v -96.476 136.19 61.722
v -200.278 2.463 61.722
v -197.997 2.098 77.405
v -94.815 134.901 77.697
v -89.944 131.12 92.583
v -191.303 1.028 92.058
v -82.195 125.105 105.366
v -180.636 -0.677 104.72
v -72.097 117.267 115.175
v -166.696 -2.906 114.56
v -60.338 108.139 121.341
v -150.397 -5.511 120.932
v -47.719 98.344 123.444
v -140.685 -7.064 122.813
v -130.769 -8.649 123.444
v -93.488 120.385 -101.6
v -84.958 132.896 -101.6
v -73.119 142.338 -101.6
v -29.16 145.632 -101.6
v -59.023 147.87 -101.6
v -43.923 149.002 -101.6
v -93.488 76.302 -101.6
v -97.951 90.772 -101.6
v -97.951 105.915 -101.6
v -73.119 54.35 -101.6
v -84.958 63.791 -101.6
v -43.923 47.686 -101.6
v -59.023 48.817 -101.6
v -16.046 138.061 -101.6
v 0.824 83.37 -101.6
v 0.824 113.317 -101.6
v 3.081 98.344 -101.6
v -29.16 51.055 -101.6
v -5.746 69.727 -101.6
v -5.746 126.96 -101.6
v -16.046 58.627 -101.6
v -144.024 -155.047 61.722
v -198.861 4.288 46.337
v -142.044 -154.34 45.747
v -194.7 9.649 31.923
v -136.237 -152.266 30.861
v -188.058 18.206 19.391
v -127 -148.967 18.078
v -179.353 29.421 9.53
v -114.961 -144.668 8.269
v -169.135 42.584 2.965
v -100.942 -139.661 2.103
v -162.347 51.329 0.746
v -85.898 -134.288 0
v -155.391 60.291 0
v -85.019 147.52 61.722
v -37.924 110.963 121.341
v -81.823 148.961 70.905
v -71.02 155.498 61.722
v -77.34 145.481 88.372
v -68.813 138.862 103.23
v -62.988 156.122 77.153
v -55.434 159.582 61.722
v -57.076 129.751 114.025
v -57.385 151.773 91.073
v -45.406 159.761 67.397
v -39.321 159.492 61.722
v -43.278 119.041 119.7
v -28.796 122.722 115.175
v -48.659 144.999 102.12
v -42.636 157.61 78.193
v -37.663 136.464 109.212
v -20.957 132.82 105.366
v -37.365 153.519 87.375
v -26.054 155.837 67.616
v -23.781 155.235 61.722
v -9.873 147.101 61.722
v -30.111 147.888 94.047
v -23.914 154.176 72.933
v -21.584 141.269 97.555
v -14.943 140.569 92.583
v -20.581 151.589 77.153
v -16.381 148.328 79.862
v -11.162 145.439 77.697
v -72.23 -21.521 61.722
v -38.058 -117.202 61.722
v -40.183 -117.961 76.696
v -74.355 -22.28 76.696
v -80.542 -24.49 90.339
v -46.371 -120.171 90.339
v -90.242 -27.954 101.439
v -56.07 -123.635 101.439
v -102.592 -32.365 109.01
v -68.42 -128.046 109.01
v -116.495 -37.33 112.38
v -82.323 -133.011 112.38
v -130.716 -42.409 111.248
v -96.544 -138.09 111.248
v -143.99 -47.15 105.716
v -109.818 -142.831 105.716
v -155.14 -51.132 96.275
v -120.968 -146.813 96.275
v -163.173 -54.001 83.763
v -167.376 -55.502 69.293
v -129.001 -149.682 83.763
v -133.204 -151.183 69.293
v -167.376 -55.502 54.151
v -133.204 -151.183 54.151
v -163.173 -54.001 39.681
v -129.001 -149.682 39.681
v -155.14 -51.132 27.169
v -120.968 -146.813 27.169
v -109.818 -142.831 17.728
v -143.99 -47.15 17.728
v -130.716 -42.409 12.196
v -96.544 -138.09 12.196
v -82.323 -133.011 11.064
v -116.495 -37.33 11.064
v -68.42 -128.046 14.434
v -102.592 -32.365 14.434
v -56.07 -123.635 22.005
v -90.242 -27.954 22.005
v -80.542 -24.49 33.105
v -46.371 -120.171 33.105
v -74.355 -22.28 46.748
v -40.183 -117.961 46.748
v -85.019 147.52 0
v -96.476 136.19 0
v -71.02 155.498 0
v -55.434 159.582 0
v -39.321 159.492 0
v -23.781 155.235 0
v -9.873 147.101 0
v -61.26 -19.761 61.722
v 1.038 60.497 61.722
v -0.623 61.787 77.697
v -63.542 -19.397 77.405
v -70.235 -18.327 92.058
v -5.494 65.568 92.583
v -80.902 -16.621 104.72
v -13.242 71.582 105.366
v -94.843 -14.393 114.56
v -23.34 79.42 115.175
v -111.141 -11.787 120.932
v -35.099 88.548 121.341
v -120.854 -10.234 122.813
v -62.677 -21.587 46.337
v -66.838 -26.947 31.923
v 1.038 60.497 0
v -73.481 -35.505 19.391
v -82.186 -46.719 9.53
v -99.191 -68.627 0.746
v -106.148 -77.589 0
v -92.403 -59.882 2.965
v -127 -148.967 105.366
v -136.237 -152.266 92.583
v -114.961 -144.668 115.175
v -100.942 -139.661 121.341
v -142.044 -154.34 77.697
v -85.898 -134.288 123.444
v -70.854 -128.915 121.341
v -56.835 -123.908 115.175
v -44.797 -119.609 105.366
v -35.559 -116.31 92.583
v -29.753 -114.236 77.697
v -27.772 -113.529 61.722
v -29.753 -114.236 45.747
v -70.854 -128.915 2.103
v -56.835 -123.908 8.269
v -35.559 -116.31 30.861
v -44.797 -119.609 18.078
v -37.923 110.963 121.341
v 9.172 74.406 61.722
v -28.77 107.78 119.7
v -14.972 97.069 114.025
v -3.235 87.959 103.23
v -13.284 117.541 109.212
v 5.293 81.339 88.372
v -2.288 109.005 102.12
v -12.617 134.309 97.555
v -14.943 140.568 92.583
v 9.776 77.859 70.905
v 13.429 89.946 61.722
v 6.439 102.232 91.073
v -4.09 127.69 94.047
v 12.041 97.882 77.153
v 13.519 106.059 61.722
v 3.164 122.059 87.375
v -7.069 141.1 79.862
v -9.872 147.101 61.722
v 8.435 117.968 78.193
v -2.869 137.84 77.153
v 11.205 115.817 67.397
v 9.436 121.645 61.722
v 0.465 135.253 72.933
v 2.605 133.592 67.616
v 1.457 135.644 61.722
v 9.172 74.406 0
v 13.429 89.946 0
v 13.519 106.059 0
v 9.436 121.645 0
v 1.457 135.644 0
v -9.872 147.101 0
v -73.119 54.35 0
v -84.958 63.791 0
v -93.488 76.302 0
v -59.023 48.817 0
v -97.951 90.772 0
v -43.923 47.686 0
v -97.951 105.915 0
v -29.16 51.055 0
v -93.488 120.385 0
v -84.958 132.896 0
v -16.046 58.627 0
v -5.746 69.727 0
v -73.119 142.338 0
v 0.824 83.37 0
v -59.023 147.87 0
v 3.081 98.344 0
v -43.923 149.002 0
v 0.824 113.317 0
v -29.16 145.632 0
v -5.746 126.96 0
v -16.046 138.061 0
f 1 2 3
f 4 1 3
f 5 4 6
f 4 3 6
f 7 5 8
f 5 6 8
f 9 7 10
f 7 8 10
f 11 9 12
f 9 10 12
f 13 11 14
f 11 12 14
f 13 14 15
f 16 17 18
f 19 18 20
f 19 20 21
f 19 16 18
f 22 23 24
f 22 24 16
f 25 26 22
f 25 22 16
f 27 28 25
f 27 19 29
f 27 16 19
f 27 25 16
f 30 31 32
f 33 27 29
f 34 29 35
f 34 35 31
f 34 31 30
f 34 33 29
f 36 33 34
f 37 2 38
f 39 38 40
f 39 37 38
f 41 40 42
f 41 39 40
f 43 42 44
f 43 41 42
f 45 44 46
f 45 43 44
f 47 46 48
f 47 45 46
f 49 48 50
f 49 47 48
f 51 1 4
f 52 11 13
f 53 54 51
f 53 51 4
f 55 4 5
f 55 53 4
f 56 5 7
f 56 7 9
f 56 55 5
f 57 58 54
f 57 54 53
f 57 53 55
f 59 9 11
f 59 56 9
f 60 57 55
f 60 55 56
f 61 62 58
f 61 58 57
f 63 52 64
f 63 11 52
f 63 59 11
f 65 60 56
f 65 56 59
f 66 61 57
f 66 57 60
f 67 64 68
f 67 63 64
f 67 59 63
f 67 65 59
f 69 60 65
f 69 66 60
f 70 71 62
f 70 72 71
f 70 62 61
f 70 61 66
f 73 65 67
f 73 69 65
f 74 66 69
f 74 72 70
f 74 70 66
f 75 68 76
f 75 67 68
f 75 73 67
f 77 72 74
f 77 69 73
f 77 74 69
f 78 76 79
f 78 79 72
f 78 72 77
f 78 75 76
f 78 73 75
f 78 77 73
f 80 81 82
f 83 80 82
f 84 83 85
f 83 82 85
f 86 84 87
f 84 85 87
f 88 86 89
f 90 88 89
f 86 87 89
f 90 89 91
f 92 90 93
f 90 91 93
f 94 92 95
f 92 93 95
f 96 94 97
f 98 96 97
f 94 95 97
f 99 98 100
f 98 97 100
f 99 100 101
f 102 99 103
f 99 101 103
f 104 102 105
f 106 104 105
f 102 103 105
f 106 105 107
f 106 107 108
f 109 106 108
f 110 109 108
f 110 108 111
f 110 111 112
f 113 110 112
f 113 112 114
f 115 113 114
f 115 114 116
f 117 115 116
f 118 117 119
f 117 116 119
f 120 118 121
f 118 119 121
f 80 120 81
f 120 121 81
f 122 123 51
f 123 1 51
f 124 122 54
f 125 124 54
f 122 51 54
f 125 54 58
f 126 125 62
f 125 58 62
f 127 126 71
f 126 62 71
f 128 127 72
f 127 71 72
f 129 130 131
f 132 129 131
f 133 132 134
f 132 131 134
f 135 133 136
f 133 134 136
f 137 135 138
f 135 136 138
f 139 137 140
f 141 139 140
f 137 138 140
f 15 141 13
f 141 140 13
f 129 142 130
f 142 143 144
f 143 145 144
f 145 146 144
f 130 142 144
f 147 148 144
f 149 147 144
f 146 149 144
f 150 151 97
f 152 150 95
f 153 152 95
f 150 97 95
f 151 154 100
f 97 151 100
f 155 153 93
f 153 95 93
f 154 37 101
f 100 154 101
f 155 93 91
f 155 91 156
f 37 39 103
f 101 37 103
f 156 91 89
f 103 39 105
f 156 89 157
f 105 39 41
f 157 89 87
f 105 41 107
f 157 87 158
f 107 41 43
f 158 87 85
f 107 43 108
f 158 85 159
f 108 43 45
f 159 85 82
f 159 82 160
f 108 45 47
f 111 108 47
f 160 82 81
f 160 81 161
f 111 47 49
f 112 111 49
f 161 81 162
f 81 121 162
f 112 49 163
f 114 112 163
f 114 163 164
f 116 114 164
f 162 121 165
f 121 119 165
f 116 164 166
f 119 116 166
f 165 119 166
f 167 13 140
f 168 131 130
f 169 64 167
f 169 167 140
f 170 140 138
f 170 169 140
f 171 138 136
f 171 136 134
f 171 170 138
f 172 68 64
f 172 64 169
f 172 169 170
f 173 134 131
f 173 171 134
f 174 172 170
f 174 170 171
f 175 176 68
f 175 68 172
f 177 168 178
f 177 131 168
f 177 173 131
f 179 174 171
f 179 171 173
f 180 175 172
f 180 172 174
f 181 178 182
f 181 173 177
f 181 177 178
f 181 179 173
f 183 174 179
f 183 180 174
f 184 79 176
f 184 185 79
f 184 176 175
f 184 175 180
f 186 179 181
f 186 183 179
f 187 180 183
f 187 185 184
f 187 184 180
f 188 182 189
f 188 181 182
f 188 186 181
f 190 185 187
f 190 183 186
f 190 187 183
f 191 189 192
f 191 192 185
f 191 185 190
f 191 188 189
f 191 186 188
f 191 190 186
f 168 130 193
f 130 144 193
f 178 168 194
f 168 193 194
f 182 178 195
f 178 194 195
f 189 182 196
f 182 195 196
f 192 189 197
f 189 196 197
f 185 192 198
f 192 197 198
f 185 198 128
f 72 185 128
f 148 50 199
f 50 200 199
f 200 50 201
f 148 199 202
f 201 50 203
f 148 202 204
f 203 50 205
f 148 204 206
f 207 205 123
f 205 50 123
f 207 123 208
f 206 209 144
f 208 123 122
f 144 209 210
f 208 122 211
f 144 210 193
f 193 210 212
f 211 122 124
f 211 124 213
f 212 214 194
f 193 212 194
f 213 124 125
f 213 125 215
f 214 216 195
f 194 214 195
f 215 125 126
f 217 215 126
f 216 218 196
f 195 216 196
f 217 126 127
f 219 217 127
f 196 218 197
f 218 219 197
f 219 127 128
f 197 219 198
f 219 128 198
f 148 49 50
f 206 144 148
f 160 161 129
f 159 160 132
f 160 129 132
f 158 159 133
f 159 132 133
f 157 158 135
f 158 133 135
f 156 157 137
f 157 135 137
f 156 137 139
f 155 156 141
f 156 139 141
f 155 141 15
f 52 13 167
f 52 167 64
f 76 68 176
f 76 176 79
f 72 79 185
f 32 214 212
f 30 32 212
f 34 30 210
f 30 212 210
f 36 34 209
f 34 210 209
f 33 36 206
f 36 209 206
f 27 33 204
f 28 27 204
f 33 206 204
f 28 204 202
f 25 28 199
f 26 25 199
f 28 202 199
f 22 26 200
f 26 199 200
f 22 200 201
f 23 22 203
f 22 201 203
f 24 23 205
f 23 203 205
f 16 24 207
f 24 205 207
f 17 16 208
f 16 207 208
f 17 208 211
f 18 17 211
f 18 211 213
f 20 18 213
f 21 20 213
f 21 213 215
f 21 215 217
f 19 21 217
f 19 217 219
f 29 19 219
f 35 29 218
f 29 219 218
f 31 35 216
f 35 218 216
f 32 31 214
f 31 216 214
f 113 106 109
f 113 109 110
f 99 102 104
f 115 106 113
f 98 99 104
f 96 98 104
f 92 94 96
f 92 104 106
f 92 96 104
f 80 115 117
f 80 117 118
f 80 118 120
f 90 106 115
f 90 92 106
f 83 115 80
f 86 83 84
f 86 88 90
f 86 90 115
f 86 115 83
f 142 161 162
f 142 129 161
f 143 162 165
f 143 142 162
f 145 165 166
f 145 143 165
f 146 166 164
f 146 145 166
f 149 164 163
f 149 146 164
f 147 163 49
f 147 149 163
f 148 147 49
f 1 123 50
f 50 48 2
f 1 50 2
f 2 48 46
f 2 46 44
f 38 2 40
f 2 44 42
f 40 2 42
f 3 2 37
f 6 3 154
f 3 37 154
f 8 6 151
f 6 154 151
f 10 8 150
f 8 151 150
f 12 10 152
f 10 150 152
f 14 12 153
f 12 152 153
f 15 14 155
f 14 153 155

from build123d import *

# Parameters (mm, degrees)
BOSS_EXTRUDE1_DEPTH = 123.444
FILLET1_R           = 61.722
FILLET2_R           = 61.722
SKETCH3_R           = 50.800000000000004
BOSS_EXTRUDE2_DEPTH = 101.6
SKETCH4_R           = 50.8
CUT_EXTRUDE1_DEPTH  = 101.6


with BuildPart() as part:
    # Sketch1 → Boss-Extrude1 (new body)
    with BuildSketch(Plane.XY):
        Polygon((-61.2603734439835, -19.761410788381728), (38.88466731371064, 109.25427234990879), (-58.62951931958517, 184.9471025337958), (-200.27811700244362, 2.4628730865096857), (-144.02441960258417, -155.04747963309688), (-27.772031067671065, -113.52876944205649), align=None)
    extrude(amount=BOSS_EXTRUDE1_DEPTH)

    # Fillet1
    fillet1_edges = [part.edges().sort_by_distance(p)[0] for p in [
        (-44.51620225582728, -66.6450901152191, 123.444),
        (-172.1512683025139, -76.2923032732936, 123.444),
        (-172.1512683025139, -76.2923032732936, 0),
        (-44.51620225582728, -66.6450901152191, 0),
        (-11.187853065136423, 44.74643078076353, 123.444),
        (-129.4538181610144, 93.70498781015274, 123.444),
    ]]
    fillet(fillet1_edges, radius=FILLET1_R - 0.0001)  # a hair under: the kernel refuses the full size

    # Fillet2
    fillet2_edges = [part.edges().sort_by_distance(p)[0] for p in [
        (-58.62951931958517, 184.9471025337958, 30.861050000000017),
        (38.88466731371064, 109.25427234990879, 30.86105000000001),
        (24.604068449214424, 120.33921272724501, 105.36607403771798),
        (-44.34892045508896, 173.86216215645953, 105.366074037718),
    ]]
    fillet(fillet2_edges, radius=FILLET2_R - 0.0001)  # a hair under: the kernel refuses the full size

    # Sketch3 → Boss-Extrude2 (add)
    with BuildSketch(Plane(origin=(0, 0, 0), x_dir=(-1, 0, 0), z_dir=(0, 0, -1))):
        with Locations(Location((47.71884109488077, 98.3435941252044, 0), (0, 0, 180))):
            Circle(SKETCH3_R)
    extrude(amount=BOSS_EXTRUDE2_DEPTH)

    # Sketch4 → Cut-Extrude1 (cut)
    with BuildSketch(Plane(origin=(32.81770626358453, -91.88957753803668, 0), x_dir=(0.9417419115948374, 0.3363363969981563, 0), z_dir=(0.3363363969981563, -0.9417419115948374, 0))):
        with Locations((-126.05994289631548, 61.722)):
            Circle(SKETCH4_R)
    extrude(amount=-CUT_EXTRUDE1_DEPTH, mode=Mode.SUBTRACT)


solid = part.part
